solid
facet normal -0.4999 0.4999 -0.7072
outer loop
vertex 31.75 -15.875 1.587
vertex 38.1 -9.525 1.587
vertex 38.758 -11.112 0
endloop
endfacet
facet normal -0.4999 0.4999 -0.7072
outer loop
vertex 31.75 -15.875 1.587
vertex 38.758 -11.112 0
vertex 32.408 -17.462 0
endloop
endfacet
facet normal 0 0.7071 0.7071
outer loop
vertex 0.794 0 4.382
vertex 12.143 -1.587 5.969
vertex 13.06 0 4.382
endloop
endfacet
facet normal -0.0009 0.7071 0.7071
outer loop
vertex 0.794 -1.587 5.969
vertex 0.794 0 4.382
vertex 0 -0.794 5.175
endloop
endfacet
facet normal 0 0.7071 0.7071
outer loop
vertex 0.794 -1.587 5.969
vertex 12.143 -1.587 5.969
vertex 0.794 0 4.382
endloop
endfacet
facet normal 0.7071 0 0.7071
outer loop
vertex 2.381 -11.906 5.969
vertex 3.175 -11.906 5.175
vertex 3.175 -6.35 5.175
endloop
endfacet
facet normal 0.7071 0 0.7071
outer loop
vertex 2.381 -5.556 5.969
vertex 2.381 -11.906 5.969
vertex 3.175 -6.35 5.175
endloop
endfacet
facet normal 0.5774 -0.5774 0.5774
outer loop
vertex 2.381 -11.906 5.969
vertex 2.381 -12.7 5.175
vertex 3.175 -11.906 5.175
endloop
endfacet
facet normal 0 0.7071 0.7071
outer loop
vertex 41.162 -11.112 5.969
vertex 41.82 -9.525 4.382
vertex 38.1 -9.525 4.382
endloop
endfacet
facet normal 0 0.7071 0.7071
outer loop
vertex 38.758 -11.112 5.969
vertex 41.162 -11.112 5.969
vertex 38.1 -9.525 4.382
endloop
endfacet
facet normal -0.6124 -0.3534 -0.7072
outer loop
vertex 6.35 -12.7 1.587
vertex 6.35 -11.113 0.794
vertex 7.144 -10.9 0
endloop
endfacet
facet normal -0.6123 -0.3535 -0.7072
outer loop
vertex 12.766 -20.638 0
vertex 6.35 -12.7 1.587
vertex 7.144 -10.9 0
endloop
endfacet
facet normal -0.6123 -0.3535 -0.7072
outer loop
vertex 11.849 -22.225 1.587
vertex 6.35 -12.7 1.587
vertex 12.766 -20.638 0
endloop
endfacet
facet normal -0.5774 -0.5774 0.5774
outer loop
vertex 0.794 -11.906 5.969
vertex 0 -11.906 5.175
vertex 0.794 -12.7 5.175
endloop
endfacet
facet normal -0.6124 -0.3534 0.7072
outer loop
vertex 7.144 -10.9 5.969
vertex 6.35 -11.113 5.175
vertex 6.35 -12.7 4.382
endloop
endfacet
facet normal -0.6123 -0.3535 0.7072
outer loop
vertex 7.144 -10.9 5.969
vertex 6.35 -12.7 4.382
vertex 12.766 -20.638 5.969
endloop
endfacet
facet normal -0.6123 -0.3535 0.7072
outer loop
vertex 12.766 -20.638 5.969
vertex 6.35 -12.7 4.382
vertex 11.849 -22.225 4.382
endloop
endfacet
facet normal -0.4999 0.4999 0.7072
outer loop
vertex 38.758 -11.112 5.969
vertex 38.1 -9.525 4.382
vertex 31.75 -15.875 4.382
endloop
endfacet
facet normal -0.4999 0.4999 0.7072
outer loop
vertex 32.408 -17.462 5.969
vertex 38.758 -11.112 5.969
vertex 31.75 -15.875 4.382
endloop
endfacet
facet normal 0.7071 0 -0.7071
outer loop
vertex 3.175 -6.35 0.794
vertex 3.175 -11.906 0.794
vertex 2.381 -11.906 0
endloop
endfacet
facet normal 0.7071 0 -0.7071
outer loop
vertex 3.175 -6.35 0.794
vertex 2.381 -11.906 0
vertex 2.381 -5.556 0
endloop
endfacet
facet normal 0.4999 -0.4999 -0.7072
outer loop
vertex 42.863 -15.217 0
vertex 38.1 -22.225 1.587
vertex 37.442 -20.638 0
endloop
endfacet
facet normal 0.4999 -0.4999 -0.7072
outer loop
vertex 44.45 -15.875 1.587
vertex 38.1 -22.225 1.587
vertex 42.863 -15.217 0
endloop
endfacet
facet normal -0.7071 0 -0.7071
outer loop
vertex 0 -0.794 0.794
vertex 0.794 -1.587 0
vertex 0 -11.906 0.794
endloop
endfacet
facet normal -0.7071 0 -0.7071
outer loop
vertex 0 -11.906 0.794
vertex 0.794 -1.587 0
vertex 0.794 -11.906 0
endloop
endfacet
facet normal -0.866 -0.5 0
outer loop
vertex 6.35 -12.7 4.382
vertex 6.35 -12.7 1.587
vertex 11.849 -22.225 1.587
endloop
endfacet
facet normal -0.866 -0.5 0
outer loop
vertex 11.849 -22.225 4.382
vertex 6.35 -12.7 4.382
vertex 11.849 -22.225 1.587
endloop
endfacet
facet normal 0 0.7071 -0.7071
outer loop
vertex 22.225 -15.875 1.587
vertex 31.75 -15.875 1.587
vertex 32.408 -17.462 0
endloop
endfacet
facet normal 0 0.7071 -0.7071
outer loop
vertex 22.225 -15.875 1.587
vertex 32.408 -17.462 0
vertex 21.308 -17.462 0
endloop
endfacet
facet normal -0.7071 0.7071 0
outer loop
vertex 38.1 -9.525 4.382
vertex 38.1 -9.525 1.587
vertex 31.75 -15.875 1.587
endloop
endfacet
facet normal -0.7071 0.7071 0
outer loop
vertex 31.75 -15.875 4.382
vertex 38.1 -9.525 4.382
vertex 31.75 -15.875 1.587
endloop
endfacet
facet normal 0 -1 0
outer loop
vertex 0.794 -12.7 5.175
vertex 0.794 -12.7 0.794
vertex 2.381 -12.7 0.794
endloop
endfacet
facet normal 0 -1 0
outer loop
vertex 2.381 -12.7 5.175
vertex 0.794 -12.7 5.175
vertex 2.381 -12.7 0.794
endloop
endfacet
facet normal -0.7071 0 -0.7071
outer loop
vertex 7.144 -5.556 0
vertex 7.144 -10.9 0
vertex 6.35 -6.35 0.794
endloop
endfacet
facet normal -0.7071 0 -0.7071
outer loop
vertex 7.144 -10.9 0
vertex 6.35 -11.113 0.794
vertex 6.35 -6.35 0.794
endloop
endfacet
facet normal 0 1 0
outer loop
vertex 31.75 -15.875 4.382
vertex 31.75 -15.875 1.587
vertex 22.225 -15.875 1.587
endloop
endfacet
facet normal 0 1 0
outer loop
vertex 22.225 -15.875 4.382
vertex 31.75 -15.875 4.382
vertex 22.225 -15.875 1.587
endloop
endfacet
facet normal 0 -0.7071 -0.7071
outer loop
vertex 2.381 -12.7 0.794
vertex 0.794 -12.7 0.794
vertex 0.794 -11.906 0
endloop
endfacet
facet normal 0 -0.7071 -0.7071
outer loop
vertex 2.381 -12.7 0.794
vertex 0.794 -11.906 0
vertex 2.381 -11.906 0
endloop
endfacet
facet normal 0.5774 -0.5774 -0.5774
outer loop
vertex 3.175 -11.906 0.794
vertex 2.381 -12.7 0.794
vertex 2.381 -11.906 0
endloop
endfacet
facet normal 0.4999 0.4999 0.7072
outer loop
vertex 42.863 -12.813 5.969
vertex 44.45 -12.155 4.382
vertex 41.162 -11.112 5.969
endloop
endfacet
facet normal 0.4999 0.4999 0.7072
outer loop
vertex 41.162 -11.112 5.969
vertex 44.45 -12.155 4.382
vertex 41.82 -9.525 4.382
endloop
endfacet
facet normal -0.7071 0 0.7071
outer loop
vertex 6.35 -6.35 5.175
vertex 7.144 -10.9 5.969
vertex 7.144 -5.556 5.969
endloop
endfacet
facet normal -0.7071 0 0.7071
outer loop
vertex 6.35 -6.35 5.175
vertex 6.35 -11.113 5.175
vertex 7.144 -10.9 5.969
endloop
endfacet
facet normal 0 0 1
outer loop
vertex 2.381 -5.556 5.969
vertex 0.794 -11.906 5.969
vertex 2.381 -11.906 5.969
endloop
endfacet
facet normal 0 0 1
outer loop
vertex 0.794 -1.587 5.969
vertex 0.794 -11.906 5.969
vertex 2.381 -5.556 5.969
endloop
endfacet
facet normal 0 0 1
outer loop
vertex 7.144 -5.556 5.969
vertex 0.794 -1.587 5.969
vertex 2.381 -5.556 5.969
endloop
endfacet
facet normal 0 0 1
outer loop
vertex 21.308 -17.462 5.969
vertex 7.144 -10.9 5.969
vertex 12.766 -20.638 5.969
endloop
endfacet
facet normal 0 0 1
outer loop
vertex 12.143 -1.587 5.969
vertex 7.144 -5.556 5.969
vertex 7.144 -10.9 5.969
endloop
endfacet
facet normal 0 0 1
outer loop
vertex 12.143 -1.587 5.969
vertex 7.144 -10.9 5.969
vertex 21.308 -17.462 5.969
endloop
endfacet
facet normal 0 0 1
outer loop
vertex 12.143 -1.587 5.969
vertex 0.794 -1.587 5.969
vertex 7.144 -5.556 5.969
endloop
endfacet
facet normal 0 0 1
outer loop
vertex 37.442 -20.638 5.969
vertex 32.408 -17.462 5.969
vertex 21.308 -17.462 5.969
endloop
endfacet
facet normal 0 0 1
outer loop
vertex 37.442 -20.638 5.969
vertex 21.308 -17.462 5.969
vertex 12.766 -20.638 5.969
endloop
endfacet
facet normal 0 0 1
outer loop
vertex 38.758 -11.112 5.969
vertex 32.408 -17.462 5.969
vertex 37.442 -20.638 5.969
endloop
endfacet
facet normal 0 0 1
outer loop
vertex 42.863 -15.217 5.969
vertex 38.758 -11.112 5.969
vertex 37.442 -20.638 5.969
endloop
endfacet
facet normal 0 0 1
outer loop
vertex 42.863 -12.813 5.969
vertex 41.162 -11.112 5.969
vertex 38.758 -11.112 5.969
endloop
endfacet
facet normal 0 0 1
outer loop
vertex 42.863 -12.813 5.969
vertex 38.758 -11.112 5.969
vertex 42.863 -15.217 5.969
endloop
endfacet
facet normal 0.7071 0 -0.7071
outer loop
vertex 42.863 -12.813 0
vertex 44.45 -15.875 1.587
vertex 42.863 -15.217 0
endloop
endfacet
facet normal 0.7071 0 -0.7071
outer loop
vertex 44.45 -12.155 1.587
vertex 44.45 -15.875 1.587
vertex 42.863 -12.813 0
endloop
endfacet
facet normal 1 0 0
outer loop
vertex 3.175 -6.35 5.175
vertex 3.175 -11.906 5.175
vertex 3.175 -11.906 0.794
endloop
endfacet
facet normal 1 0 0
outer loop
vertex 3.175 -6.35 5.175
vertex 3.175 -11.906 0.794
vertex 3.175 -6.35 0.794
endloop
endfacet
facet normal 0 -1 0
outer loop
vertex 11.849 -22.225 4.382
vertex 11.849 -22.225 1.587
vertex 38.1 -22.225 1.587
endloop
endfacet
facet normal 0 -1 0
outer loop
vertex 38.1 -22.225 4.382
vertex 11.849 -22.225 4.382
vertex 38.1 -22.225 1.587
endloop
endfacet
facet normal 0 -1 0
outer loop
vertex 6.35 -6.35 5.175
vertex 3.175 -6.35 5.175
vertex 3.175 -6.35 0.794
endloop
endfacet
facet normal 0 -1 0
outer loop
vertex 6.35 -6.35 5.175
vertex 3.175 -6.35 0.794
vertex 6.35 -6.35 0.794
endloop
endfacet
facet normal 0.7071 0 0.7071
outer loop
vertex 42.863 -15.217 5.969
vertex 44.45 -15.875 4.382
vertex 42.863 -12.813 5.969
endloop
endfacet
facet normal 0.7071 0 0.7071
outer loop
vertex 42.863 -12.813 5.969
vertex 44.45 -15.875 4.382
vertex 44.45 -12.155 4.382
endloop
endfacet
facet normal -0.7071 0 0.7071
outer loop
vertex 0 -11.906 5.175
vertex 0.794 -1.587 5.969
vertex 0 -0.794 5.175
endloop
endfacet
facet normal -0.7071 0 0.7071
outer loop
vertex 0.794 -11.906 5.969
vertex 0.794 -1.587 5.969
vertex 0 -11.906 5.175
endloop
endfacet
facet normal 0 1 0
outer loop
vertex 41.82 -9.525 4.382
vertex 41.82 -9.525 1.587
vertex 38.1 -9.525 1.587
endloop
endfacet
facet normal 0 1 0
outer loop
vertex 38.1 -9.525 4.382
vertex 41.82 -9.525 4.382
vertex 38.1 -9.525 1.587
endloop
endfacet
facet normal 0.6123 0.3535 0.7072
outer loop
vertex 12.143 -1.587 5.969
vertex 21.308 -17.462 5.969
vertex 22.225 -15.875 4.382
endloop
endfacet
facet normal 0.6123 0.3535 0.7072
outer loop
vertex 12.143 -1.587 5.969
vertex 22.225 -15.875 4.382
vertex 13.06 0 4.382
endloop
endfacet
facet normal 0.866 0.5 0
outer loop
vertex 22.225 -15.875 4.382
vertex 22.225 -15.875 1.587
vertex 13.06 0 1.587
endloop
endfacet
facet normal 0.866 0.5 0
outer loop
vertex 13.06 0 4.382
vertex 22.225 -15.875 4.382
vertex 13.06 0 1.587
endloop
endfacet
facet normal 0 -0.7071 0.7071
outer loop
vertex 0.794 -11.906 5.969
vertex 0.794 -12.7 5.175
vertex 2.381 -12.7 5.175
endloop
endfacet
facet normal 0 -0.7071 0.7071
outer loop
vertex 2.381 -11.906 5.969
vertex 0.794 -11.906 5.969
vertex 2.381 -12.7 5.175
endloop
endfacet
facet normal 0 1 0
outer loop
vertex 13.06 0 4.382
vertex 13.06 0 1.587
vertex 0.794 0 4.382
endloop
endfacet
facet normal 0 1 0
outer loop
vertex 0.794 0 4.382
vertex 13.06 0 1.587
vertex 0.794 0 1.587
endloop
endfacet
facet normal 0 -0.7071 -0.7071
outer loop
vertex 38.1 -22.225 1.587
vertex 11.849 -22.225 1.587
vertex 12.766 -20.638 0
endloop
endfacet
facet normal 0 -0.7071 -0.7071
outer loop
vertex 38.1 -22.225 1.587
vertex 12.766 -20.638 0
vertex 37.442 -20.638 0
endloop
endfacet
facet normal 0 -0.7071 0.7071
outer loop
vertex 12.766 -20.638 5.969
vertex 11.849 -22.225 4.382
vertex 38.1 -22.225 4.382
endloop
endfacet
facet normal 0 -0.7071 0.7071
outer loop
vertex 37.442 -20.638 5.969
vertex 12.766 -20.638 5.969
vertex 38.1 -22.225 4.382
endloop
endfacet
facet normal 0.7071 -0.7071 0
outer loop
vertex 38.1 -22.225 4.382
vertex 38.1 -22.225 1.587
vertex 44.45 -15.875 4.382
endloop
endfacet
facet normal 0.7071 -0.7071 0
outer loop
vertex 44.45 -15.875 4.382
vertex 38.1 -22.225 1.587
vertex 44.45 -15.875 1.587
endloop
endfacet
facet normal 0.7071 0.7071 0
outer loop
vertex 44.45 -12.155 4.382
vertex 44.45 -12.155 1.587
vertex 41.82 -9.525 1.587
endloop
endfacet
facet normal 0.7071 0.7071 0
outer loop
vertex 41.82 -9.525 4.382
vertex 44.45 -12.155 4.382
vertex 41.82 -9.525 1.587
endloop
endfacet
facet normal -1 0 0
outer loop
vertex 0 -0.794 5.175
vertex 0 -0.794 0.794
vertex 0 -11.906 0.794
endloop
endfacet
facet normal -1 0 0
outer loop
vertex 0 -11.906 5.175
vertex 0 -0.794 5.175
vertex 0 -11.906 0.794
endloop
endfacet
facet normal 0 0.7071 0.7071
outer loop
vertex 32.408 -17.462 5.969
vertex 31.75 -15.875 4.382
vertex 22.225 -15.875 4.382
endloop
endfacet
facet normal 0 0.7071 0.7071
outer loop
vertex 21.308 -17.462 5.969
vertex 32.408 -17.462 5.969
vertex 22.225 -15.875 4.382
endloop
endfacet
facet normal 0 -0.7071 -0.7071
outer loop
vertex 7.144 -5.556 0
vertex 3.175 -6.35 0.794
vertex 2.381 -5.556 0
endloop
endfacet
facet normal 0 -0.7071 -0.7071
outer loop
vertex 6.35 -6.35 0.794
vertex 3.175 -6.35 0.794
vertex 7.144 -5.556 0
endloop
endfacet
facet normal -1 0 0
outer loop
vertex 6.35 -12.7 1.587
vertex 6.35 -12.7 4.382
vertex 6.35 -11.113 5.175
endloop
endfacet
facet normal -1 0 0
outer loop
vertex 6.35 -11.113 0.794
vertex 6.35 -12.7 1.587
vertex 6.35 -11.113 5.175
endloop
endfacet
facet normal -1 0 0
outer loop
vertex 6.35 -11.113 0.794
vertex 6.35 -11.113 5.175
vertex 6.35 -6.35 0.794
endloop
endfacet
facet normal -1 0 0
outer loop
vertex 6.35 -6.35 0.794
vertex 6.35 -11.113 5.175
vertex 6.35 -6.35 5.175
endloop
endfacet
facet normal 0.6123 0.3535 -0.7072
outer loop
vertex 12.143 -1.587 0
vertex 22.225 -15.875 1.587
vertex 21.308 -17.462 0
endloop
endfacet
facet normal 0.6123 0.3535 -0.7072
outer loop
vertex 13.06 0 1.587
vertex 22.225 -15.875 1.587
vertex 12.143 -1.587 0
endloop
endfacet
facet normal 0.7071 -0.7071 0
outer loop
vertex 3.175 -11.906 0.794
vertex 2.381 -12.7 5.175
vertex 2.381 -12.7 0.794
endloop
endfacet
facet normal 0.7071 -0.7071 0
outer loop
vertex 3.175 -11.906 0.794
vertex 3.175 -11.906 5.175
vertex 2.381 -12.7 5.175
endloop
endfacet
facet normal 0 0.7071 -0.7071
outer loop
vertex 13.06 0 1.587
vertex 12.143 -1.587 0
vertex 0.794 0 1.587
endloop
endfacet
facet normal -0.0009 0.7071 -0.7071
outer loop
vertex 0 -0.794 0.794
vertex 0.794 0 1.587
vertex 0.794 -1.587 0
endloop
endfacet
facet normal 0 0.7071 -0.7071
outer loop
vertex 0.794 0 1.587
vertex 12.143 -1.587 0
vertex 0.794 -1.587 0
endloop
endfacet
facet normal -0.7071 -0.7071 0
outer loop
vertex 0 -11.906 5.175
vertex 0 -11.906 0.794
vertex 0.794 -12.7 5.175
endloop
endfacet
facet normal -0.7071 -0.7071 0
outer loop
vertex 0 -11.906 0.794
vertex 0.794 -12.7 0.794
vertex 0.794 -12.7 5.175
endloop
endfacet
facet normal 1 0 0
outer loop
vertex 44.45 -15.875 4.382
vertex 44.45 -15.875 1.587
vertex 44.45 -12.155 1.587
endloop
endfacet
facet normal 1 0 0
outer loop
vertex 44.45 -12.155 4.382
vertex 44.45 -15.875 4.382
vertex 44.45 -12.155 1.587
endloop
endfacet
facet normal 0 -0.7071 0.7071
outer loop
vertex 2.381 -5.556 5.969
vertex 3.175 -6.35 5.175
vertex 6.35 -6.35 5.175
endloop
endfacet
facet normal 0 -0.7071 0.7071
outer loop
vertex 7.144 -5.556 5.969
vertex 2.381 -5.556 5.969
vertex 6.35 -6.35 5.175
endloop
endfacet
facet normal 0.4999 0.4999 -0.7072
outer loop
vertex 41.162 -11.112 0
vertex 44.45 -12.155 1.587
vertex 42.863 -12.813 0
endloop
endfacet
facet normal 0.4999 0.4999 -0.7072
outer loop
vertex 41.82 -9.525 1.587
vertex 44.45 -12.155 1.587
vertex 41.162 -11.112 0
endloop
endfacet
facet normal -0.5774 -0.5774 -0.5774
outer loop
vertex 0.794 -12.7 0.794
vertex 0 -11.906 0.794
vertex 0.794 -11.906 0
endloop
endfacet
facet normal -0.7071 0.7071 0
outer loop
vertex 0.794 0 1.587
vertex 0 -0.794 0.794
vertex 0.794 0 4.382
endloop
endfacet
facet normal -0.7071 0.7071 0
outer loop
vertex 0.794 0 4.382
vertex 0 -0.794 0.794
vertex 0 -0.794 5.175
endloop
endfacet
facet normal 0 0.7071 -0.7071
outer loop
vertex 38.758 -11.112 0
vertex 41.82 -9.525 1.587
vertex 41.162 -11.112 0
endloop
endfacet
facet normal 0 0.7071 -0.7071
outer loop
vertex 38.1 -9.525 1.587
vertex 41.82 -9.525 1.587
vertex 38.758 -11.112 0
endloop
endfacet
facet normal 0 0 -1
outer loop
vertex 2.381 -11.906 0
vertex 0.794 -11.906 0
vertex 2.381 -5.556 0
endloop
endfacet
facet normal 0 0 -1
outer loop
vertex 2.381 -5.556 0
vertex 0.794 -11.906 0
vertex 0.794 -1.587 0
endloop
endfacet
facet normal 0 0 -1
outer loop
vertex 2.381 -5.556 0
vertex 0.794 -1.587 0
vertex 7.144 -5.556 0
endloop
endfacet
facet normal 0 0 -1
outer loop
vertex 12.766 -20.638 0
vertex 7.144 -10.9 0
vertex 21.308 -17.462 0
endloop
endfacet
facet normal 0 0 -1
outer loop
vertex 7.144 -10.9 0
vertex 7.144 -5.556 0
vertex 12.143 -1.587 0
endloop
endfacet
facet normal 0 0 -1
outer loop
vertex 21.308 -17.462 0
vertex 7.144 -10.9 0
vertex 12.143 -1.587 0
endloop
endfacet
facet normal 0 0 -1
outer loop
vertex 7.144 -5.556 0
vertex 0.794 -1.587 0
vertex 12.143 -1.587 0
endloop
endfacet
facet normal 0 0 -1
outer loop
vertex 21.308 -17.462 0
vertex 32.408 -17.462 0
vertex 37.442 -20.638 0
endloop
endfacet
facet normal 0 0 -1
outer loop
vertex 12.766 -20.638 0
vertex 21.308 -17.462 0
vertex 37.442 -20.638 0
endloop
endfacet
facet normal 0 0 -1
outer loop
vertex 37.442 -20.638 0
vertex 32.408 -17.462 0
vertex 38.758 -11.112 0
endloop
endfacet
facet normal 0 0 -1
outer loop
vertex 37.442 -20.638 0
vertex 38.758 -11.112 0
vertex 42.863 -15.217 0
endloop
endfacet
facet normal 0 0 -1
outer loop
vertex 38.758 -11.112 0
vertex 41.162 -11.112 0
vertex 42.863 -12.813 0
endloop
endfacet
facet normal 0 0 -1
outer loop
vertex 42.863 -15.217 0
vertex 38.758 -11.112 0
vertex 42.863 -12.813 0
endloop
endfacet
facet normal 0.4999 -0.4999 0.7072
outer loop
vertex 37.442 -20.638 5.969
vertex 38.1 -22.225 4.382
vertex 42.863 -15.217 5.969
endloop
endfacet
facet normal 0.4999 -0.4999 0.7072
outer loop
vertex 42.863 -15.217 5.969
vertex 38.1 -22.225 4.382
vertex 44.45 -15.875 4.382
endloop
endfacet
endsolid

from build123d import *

# Parameters (mm, degrees)
F1_DEPTH = 5.969
F2_W     = 3.175
F2_H     = 6.35
F3_DEPTH = 5.97
F4_SIZE  = 0.79375
F5_SIZE  = 1.58749


# Not quite as in the source:
# - a fillet or chamfer is up to 0.001 mm smaller than in the source, because OpenCascade refuses the exact size


with BuildPart() as f1:
    # F0 (on Top) → F1 (new body)
    with BuildSketch(Plane.XY):
        Polygon((13.0595644766, 0), (0, 0), (0, -12.7), (6.35, -12.7), (11.849261314, -22.225), (38.1, -22.225), (44.45, -15.875), (44.45, -12.1552561211), (41.8197438789, -9.525), (38.1, -9.525), (31.75, -15.875), (22.225, -15.875), align=None)
    extrude(amount=F1_DEPTH)

    # F2 (on face) → F3 (cut, through all)
    with BuildSketch(Plane.XY.offset(5.969)):
        with Locations((4.7625, -9.525)):
            Rectangle(F2_W, F2_H)
    extrude(amount=-F3_DEPTH, mode=Mode.SUBTRACT)

    # F4
    f4_edges = [f1.edges().sort_by_distance(p)[0] for p in [
        (0, 0, 2.9845),
        (0, -12.7, 2.9845),
        (0, -6.35, 0),
        (0, -6.35, 5.969),
        (1.5875, -12.7, 0),
        (3.175, -12.7, 2.9845),
        (1.5875, -12.7, 5.969),
        (3.175, -9.525, 5.969),
        (3.175, -9.525, 0),
        (4.7625, -6.35, 5.969),
        (6.35, -9.525, 5.969),
        (4.7625, -6.35, 0),
        (6.35, -9.525, 0),
    ]]
    chamfer(f4_edges, length=F4_SIZE)

    # F5 (size 1.5875 in the source; OpenCascade refuses exactly that, so slightly less here)
    f5_edges = [f1.edges().sort_by_distance(p)[0] for p in [
        (6.926657, 0, 0),
        (17.642282, -7.9375, 0),
        (26.9875, -15.875, 0),
        (34.925, -12.7, 0),
        (39.959872, -9.525, 0),
        (43.134872, -10.840128, 0),
        (44.45, -14.015128, 0),
        (41.275, -19.05, 0),
        (24.974631, -22.225, 0),
        (9.496506, -18.149908, 0),
        (9.496506, -18.149908, 5.969),
        (24.974631, -22.225, 5.969),
        (41.275, -19.05, 5.969),
        (44.45, -14.015128, 5.969),
        (43.134872, -10.840128, 5.969),
        (34.925, -12.7, 5.969),
        (39.959872, -9.525, 5.969),
        (26.9875, -15.875, 5.969),
        (17.642282, -7.9375, 5.969),
        (6.926657, 0, 5.969),
    ]]
    chamfer(f5_edges, length=F5_SIZE)


solid = f1.part
